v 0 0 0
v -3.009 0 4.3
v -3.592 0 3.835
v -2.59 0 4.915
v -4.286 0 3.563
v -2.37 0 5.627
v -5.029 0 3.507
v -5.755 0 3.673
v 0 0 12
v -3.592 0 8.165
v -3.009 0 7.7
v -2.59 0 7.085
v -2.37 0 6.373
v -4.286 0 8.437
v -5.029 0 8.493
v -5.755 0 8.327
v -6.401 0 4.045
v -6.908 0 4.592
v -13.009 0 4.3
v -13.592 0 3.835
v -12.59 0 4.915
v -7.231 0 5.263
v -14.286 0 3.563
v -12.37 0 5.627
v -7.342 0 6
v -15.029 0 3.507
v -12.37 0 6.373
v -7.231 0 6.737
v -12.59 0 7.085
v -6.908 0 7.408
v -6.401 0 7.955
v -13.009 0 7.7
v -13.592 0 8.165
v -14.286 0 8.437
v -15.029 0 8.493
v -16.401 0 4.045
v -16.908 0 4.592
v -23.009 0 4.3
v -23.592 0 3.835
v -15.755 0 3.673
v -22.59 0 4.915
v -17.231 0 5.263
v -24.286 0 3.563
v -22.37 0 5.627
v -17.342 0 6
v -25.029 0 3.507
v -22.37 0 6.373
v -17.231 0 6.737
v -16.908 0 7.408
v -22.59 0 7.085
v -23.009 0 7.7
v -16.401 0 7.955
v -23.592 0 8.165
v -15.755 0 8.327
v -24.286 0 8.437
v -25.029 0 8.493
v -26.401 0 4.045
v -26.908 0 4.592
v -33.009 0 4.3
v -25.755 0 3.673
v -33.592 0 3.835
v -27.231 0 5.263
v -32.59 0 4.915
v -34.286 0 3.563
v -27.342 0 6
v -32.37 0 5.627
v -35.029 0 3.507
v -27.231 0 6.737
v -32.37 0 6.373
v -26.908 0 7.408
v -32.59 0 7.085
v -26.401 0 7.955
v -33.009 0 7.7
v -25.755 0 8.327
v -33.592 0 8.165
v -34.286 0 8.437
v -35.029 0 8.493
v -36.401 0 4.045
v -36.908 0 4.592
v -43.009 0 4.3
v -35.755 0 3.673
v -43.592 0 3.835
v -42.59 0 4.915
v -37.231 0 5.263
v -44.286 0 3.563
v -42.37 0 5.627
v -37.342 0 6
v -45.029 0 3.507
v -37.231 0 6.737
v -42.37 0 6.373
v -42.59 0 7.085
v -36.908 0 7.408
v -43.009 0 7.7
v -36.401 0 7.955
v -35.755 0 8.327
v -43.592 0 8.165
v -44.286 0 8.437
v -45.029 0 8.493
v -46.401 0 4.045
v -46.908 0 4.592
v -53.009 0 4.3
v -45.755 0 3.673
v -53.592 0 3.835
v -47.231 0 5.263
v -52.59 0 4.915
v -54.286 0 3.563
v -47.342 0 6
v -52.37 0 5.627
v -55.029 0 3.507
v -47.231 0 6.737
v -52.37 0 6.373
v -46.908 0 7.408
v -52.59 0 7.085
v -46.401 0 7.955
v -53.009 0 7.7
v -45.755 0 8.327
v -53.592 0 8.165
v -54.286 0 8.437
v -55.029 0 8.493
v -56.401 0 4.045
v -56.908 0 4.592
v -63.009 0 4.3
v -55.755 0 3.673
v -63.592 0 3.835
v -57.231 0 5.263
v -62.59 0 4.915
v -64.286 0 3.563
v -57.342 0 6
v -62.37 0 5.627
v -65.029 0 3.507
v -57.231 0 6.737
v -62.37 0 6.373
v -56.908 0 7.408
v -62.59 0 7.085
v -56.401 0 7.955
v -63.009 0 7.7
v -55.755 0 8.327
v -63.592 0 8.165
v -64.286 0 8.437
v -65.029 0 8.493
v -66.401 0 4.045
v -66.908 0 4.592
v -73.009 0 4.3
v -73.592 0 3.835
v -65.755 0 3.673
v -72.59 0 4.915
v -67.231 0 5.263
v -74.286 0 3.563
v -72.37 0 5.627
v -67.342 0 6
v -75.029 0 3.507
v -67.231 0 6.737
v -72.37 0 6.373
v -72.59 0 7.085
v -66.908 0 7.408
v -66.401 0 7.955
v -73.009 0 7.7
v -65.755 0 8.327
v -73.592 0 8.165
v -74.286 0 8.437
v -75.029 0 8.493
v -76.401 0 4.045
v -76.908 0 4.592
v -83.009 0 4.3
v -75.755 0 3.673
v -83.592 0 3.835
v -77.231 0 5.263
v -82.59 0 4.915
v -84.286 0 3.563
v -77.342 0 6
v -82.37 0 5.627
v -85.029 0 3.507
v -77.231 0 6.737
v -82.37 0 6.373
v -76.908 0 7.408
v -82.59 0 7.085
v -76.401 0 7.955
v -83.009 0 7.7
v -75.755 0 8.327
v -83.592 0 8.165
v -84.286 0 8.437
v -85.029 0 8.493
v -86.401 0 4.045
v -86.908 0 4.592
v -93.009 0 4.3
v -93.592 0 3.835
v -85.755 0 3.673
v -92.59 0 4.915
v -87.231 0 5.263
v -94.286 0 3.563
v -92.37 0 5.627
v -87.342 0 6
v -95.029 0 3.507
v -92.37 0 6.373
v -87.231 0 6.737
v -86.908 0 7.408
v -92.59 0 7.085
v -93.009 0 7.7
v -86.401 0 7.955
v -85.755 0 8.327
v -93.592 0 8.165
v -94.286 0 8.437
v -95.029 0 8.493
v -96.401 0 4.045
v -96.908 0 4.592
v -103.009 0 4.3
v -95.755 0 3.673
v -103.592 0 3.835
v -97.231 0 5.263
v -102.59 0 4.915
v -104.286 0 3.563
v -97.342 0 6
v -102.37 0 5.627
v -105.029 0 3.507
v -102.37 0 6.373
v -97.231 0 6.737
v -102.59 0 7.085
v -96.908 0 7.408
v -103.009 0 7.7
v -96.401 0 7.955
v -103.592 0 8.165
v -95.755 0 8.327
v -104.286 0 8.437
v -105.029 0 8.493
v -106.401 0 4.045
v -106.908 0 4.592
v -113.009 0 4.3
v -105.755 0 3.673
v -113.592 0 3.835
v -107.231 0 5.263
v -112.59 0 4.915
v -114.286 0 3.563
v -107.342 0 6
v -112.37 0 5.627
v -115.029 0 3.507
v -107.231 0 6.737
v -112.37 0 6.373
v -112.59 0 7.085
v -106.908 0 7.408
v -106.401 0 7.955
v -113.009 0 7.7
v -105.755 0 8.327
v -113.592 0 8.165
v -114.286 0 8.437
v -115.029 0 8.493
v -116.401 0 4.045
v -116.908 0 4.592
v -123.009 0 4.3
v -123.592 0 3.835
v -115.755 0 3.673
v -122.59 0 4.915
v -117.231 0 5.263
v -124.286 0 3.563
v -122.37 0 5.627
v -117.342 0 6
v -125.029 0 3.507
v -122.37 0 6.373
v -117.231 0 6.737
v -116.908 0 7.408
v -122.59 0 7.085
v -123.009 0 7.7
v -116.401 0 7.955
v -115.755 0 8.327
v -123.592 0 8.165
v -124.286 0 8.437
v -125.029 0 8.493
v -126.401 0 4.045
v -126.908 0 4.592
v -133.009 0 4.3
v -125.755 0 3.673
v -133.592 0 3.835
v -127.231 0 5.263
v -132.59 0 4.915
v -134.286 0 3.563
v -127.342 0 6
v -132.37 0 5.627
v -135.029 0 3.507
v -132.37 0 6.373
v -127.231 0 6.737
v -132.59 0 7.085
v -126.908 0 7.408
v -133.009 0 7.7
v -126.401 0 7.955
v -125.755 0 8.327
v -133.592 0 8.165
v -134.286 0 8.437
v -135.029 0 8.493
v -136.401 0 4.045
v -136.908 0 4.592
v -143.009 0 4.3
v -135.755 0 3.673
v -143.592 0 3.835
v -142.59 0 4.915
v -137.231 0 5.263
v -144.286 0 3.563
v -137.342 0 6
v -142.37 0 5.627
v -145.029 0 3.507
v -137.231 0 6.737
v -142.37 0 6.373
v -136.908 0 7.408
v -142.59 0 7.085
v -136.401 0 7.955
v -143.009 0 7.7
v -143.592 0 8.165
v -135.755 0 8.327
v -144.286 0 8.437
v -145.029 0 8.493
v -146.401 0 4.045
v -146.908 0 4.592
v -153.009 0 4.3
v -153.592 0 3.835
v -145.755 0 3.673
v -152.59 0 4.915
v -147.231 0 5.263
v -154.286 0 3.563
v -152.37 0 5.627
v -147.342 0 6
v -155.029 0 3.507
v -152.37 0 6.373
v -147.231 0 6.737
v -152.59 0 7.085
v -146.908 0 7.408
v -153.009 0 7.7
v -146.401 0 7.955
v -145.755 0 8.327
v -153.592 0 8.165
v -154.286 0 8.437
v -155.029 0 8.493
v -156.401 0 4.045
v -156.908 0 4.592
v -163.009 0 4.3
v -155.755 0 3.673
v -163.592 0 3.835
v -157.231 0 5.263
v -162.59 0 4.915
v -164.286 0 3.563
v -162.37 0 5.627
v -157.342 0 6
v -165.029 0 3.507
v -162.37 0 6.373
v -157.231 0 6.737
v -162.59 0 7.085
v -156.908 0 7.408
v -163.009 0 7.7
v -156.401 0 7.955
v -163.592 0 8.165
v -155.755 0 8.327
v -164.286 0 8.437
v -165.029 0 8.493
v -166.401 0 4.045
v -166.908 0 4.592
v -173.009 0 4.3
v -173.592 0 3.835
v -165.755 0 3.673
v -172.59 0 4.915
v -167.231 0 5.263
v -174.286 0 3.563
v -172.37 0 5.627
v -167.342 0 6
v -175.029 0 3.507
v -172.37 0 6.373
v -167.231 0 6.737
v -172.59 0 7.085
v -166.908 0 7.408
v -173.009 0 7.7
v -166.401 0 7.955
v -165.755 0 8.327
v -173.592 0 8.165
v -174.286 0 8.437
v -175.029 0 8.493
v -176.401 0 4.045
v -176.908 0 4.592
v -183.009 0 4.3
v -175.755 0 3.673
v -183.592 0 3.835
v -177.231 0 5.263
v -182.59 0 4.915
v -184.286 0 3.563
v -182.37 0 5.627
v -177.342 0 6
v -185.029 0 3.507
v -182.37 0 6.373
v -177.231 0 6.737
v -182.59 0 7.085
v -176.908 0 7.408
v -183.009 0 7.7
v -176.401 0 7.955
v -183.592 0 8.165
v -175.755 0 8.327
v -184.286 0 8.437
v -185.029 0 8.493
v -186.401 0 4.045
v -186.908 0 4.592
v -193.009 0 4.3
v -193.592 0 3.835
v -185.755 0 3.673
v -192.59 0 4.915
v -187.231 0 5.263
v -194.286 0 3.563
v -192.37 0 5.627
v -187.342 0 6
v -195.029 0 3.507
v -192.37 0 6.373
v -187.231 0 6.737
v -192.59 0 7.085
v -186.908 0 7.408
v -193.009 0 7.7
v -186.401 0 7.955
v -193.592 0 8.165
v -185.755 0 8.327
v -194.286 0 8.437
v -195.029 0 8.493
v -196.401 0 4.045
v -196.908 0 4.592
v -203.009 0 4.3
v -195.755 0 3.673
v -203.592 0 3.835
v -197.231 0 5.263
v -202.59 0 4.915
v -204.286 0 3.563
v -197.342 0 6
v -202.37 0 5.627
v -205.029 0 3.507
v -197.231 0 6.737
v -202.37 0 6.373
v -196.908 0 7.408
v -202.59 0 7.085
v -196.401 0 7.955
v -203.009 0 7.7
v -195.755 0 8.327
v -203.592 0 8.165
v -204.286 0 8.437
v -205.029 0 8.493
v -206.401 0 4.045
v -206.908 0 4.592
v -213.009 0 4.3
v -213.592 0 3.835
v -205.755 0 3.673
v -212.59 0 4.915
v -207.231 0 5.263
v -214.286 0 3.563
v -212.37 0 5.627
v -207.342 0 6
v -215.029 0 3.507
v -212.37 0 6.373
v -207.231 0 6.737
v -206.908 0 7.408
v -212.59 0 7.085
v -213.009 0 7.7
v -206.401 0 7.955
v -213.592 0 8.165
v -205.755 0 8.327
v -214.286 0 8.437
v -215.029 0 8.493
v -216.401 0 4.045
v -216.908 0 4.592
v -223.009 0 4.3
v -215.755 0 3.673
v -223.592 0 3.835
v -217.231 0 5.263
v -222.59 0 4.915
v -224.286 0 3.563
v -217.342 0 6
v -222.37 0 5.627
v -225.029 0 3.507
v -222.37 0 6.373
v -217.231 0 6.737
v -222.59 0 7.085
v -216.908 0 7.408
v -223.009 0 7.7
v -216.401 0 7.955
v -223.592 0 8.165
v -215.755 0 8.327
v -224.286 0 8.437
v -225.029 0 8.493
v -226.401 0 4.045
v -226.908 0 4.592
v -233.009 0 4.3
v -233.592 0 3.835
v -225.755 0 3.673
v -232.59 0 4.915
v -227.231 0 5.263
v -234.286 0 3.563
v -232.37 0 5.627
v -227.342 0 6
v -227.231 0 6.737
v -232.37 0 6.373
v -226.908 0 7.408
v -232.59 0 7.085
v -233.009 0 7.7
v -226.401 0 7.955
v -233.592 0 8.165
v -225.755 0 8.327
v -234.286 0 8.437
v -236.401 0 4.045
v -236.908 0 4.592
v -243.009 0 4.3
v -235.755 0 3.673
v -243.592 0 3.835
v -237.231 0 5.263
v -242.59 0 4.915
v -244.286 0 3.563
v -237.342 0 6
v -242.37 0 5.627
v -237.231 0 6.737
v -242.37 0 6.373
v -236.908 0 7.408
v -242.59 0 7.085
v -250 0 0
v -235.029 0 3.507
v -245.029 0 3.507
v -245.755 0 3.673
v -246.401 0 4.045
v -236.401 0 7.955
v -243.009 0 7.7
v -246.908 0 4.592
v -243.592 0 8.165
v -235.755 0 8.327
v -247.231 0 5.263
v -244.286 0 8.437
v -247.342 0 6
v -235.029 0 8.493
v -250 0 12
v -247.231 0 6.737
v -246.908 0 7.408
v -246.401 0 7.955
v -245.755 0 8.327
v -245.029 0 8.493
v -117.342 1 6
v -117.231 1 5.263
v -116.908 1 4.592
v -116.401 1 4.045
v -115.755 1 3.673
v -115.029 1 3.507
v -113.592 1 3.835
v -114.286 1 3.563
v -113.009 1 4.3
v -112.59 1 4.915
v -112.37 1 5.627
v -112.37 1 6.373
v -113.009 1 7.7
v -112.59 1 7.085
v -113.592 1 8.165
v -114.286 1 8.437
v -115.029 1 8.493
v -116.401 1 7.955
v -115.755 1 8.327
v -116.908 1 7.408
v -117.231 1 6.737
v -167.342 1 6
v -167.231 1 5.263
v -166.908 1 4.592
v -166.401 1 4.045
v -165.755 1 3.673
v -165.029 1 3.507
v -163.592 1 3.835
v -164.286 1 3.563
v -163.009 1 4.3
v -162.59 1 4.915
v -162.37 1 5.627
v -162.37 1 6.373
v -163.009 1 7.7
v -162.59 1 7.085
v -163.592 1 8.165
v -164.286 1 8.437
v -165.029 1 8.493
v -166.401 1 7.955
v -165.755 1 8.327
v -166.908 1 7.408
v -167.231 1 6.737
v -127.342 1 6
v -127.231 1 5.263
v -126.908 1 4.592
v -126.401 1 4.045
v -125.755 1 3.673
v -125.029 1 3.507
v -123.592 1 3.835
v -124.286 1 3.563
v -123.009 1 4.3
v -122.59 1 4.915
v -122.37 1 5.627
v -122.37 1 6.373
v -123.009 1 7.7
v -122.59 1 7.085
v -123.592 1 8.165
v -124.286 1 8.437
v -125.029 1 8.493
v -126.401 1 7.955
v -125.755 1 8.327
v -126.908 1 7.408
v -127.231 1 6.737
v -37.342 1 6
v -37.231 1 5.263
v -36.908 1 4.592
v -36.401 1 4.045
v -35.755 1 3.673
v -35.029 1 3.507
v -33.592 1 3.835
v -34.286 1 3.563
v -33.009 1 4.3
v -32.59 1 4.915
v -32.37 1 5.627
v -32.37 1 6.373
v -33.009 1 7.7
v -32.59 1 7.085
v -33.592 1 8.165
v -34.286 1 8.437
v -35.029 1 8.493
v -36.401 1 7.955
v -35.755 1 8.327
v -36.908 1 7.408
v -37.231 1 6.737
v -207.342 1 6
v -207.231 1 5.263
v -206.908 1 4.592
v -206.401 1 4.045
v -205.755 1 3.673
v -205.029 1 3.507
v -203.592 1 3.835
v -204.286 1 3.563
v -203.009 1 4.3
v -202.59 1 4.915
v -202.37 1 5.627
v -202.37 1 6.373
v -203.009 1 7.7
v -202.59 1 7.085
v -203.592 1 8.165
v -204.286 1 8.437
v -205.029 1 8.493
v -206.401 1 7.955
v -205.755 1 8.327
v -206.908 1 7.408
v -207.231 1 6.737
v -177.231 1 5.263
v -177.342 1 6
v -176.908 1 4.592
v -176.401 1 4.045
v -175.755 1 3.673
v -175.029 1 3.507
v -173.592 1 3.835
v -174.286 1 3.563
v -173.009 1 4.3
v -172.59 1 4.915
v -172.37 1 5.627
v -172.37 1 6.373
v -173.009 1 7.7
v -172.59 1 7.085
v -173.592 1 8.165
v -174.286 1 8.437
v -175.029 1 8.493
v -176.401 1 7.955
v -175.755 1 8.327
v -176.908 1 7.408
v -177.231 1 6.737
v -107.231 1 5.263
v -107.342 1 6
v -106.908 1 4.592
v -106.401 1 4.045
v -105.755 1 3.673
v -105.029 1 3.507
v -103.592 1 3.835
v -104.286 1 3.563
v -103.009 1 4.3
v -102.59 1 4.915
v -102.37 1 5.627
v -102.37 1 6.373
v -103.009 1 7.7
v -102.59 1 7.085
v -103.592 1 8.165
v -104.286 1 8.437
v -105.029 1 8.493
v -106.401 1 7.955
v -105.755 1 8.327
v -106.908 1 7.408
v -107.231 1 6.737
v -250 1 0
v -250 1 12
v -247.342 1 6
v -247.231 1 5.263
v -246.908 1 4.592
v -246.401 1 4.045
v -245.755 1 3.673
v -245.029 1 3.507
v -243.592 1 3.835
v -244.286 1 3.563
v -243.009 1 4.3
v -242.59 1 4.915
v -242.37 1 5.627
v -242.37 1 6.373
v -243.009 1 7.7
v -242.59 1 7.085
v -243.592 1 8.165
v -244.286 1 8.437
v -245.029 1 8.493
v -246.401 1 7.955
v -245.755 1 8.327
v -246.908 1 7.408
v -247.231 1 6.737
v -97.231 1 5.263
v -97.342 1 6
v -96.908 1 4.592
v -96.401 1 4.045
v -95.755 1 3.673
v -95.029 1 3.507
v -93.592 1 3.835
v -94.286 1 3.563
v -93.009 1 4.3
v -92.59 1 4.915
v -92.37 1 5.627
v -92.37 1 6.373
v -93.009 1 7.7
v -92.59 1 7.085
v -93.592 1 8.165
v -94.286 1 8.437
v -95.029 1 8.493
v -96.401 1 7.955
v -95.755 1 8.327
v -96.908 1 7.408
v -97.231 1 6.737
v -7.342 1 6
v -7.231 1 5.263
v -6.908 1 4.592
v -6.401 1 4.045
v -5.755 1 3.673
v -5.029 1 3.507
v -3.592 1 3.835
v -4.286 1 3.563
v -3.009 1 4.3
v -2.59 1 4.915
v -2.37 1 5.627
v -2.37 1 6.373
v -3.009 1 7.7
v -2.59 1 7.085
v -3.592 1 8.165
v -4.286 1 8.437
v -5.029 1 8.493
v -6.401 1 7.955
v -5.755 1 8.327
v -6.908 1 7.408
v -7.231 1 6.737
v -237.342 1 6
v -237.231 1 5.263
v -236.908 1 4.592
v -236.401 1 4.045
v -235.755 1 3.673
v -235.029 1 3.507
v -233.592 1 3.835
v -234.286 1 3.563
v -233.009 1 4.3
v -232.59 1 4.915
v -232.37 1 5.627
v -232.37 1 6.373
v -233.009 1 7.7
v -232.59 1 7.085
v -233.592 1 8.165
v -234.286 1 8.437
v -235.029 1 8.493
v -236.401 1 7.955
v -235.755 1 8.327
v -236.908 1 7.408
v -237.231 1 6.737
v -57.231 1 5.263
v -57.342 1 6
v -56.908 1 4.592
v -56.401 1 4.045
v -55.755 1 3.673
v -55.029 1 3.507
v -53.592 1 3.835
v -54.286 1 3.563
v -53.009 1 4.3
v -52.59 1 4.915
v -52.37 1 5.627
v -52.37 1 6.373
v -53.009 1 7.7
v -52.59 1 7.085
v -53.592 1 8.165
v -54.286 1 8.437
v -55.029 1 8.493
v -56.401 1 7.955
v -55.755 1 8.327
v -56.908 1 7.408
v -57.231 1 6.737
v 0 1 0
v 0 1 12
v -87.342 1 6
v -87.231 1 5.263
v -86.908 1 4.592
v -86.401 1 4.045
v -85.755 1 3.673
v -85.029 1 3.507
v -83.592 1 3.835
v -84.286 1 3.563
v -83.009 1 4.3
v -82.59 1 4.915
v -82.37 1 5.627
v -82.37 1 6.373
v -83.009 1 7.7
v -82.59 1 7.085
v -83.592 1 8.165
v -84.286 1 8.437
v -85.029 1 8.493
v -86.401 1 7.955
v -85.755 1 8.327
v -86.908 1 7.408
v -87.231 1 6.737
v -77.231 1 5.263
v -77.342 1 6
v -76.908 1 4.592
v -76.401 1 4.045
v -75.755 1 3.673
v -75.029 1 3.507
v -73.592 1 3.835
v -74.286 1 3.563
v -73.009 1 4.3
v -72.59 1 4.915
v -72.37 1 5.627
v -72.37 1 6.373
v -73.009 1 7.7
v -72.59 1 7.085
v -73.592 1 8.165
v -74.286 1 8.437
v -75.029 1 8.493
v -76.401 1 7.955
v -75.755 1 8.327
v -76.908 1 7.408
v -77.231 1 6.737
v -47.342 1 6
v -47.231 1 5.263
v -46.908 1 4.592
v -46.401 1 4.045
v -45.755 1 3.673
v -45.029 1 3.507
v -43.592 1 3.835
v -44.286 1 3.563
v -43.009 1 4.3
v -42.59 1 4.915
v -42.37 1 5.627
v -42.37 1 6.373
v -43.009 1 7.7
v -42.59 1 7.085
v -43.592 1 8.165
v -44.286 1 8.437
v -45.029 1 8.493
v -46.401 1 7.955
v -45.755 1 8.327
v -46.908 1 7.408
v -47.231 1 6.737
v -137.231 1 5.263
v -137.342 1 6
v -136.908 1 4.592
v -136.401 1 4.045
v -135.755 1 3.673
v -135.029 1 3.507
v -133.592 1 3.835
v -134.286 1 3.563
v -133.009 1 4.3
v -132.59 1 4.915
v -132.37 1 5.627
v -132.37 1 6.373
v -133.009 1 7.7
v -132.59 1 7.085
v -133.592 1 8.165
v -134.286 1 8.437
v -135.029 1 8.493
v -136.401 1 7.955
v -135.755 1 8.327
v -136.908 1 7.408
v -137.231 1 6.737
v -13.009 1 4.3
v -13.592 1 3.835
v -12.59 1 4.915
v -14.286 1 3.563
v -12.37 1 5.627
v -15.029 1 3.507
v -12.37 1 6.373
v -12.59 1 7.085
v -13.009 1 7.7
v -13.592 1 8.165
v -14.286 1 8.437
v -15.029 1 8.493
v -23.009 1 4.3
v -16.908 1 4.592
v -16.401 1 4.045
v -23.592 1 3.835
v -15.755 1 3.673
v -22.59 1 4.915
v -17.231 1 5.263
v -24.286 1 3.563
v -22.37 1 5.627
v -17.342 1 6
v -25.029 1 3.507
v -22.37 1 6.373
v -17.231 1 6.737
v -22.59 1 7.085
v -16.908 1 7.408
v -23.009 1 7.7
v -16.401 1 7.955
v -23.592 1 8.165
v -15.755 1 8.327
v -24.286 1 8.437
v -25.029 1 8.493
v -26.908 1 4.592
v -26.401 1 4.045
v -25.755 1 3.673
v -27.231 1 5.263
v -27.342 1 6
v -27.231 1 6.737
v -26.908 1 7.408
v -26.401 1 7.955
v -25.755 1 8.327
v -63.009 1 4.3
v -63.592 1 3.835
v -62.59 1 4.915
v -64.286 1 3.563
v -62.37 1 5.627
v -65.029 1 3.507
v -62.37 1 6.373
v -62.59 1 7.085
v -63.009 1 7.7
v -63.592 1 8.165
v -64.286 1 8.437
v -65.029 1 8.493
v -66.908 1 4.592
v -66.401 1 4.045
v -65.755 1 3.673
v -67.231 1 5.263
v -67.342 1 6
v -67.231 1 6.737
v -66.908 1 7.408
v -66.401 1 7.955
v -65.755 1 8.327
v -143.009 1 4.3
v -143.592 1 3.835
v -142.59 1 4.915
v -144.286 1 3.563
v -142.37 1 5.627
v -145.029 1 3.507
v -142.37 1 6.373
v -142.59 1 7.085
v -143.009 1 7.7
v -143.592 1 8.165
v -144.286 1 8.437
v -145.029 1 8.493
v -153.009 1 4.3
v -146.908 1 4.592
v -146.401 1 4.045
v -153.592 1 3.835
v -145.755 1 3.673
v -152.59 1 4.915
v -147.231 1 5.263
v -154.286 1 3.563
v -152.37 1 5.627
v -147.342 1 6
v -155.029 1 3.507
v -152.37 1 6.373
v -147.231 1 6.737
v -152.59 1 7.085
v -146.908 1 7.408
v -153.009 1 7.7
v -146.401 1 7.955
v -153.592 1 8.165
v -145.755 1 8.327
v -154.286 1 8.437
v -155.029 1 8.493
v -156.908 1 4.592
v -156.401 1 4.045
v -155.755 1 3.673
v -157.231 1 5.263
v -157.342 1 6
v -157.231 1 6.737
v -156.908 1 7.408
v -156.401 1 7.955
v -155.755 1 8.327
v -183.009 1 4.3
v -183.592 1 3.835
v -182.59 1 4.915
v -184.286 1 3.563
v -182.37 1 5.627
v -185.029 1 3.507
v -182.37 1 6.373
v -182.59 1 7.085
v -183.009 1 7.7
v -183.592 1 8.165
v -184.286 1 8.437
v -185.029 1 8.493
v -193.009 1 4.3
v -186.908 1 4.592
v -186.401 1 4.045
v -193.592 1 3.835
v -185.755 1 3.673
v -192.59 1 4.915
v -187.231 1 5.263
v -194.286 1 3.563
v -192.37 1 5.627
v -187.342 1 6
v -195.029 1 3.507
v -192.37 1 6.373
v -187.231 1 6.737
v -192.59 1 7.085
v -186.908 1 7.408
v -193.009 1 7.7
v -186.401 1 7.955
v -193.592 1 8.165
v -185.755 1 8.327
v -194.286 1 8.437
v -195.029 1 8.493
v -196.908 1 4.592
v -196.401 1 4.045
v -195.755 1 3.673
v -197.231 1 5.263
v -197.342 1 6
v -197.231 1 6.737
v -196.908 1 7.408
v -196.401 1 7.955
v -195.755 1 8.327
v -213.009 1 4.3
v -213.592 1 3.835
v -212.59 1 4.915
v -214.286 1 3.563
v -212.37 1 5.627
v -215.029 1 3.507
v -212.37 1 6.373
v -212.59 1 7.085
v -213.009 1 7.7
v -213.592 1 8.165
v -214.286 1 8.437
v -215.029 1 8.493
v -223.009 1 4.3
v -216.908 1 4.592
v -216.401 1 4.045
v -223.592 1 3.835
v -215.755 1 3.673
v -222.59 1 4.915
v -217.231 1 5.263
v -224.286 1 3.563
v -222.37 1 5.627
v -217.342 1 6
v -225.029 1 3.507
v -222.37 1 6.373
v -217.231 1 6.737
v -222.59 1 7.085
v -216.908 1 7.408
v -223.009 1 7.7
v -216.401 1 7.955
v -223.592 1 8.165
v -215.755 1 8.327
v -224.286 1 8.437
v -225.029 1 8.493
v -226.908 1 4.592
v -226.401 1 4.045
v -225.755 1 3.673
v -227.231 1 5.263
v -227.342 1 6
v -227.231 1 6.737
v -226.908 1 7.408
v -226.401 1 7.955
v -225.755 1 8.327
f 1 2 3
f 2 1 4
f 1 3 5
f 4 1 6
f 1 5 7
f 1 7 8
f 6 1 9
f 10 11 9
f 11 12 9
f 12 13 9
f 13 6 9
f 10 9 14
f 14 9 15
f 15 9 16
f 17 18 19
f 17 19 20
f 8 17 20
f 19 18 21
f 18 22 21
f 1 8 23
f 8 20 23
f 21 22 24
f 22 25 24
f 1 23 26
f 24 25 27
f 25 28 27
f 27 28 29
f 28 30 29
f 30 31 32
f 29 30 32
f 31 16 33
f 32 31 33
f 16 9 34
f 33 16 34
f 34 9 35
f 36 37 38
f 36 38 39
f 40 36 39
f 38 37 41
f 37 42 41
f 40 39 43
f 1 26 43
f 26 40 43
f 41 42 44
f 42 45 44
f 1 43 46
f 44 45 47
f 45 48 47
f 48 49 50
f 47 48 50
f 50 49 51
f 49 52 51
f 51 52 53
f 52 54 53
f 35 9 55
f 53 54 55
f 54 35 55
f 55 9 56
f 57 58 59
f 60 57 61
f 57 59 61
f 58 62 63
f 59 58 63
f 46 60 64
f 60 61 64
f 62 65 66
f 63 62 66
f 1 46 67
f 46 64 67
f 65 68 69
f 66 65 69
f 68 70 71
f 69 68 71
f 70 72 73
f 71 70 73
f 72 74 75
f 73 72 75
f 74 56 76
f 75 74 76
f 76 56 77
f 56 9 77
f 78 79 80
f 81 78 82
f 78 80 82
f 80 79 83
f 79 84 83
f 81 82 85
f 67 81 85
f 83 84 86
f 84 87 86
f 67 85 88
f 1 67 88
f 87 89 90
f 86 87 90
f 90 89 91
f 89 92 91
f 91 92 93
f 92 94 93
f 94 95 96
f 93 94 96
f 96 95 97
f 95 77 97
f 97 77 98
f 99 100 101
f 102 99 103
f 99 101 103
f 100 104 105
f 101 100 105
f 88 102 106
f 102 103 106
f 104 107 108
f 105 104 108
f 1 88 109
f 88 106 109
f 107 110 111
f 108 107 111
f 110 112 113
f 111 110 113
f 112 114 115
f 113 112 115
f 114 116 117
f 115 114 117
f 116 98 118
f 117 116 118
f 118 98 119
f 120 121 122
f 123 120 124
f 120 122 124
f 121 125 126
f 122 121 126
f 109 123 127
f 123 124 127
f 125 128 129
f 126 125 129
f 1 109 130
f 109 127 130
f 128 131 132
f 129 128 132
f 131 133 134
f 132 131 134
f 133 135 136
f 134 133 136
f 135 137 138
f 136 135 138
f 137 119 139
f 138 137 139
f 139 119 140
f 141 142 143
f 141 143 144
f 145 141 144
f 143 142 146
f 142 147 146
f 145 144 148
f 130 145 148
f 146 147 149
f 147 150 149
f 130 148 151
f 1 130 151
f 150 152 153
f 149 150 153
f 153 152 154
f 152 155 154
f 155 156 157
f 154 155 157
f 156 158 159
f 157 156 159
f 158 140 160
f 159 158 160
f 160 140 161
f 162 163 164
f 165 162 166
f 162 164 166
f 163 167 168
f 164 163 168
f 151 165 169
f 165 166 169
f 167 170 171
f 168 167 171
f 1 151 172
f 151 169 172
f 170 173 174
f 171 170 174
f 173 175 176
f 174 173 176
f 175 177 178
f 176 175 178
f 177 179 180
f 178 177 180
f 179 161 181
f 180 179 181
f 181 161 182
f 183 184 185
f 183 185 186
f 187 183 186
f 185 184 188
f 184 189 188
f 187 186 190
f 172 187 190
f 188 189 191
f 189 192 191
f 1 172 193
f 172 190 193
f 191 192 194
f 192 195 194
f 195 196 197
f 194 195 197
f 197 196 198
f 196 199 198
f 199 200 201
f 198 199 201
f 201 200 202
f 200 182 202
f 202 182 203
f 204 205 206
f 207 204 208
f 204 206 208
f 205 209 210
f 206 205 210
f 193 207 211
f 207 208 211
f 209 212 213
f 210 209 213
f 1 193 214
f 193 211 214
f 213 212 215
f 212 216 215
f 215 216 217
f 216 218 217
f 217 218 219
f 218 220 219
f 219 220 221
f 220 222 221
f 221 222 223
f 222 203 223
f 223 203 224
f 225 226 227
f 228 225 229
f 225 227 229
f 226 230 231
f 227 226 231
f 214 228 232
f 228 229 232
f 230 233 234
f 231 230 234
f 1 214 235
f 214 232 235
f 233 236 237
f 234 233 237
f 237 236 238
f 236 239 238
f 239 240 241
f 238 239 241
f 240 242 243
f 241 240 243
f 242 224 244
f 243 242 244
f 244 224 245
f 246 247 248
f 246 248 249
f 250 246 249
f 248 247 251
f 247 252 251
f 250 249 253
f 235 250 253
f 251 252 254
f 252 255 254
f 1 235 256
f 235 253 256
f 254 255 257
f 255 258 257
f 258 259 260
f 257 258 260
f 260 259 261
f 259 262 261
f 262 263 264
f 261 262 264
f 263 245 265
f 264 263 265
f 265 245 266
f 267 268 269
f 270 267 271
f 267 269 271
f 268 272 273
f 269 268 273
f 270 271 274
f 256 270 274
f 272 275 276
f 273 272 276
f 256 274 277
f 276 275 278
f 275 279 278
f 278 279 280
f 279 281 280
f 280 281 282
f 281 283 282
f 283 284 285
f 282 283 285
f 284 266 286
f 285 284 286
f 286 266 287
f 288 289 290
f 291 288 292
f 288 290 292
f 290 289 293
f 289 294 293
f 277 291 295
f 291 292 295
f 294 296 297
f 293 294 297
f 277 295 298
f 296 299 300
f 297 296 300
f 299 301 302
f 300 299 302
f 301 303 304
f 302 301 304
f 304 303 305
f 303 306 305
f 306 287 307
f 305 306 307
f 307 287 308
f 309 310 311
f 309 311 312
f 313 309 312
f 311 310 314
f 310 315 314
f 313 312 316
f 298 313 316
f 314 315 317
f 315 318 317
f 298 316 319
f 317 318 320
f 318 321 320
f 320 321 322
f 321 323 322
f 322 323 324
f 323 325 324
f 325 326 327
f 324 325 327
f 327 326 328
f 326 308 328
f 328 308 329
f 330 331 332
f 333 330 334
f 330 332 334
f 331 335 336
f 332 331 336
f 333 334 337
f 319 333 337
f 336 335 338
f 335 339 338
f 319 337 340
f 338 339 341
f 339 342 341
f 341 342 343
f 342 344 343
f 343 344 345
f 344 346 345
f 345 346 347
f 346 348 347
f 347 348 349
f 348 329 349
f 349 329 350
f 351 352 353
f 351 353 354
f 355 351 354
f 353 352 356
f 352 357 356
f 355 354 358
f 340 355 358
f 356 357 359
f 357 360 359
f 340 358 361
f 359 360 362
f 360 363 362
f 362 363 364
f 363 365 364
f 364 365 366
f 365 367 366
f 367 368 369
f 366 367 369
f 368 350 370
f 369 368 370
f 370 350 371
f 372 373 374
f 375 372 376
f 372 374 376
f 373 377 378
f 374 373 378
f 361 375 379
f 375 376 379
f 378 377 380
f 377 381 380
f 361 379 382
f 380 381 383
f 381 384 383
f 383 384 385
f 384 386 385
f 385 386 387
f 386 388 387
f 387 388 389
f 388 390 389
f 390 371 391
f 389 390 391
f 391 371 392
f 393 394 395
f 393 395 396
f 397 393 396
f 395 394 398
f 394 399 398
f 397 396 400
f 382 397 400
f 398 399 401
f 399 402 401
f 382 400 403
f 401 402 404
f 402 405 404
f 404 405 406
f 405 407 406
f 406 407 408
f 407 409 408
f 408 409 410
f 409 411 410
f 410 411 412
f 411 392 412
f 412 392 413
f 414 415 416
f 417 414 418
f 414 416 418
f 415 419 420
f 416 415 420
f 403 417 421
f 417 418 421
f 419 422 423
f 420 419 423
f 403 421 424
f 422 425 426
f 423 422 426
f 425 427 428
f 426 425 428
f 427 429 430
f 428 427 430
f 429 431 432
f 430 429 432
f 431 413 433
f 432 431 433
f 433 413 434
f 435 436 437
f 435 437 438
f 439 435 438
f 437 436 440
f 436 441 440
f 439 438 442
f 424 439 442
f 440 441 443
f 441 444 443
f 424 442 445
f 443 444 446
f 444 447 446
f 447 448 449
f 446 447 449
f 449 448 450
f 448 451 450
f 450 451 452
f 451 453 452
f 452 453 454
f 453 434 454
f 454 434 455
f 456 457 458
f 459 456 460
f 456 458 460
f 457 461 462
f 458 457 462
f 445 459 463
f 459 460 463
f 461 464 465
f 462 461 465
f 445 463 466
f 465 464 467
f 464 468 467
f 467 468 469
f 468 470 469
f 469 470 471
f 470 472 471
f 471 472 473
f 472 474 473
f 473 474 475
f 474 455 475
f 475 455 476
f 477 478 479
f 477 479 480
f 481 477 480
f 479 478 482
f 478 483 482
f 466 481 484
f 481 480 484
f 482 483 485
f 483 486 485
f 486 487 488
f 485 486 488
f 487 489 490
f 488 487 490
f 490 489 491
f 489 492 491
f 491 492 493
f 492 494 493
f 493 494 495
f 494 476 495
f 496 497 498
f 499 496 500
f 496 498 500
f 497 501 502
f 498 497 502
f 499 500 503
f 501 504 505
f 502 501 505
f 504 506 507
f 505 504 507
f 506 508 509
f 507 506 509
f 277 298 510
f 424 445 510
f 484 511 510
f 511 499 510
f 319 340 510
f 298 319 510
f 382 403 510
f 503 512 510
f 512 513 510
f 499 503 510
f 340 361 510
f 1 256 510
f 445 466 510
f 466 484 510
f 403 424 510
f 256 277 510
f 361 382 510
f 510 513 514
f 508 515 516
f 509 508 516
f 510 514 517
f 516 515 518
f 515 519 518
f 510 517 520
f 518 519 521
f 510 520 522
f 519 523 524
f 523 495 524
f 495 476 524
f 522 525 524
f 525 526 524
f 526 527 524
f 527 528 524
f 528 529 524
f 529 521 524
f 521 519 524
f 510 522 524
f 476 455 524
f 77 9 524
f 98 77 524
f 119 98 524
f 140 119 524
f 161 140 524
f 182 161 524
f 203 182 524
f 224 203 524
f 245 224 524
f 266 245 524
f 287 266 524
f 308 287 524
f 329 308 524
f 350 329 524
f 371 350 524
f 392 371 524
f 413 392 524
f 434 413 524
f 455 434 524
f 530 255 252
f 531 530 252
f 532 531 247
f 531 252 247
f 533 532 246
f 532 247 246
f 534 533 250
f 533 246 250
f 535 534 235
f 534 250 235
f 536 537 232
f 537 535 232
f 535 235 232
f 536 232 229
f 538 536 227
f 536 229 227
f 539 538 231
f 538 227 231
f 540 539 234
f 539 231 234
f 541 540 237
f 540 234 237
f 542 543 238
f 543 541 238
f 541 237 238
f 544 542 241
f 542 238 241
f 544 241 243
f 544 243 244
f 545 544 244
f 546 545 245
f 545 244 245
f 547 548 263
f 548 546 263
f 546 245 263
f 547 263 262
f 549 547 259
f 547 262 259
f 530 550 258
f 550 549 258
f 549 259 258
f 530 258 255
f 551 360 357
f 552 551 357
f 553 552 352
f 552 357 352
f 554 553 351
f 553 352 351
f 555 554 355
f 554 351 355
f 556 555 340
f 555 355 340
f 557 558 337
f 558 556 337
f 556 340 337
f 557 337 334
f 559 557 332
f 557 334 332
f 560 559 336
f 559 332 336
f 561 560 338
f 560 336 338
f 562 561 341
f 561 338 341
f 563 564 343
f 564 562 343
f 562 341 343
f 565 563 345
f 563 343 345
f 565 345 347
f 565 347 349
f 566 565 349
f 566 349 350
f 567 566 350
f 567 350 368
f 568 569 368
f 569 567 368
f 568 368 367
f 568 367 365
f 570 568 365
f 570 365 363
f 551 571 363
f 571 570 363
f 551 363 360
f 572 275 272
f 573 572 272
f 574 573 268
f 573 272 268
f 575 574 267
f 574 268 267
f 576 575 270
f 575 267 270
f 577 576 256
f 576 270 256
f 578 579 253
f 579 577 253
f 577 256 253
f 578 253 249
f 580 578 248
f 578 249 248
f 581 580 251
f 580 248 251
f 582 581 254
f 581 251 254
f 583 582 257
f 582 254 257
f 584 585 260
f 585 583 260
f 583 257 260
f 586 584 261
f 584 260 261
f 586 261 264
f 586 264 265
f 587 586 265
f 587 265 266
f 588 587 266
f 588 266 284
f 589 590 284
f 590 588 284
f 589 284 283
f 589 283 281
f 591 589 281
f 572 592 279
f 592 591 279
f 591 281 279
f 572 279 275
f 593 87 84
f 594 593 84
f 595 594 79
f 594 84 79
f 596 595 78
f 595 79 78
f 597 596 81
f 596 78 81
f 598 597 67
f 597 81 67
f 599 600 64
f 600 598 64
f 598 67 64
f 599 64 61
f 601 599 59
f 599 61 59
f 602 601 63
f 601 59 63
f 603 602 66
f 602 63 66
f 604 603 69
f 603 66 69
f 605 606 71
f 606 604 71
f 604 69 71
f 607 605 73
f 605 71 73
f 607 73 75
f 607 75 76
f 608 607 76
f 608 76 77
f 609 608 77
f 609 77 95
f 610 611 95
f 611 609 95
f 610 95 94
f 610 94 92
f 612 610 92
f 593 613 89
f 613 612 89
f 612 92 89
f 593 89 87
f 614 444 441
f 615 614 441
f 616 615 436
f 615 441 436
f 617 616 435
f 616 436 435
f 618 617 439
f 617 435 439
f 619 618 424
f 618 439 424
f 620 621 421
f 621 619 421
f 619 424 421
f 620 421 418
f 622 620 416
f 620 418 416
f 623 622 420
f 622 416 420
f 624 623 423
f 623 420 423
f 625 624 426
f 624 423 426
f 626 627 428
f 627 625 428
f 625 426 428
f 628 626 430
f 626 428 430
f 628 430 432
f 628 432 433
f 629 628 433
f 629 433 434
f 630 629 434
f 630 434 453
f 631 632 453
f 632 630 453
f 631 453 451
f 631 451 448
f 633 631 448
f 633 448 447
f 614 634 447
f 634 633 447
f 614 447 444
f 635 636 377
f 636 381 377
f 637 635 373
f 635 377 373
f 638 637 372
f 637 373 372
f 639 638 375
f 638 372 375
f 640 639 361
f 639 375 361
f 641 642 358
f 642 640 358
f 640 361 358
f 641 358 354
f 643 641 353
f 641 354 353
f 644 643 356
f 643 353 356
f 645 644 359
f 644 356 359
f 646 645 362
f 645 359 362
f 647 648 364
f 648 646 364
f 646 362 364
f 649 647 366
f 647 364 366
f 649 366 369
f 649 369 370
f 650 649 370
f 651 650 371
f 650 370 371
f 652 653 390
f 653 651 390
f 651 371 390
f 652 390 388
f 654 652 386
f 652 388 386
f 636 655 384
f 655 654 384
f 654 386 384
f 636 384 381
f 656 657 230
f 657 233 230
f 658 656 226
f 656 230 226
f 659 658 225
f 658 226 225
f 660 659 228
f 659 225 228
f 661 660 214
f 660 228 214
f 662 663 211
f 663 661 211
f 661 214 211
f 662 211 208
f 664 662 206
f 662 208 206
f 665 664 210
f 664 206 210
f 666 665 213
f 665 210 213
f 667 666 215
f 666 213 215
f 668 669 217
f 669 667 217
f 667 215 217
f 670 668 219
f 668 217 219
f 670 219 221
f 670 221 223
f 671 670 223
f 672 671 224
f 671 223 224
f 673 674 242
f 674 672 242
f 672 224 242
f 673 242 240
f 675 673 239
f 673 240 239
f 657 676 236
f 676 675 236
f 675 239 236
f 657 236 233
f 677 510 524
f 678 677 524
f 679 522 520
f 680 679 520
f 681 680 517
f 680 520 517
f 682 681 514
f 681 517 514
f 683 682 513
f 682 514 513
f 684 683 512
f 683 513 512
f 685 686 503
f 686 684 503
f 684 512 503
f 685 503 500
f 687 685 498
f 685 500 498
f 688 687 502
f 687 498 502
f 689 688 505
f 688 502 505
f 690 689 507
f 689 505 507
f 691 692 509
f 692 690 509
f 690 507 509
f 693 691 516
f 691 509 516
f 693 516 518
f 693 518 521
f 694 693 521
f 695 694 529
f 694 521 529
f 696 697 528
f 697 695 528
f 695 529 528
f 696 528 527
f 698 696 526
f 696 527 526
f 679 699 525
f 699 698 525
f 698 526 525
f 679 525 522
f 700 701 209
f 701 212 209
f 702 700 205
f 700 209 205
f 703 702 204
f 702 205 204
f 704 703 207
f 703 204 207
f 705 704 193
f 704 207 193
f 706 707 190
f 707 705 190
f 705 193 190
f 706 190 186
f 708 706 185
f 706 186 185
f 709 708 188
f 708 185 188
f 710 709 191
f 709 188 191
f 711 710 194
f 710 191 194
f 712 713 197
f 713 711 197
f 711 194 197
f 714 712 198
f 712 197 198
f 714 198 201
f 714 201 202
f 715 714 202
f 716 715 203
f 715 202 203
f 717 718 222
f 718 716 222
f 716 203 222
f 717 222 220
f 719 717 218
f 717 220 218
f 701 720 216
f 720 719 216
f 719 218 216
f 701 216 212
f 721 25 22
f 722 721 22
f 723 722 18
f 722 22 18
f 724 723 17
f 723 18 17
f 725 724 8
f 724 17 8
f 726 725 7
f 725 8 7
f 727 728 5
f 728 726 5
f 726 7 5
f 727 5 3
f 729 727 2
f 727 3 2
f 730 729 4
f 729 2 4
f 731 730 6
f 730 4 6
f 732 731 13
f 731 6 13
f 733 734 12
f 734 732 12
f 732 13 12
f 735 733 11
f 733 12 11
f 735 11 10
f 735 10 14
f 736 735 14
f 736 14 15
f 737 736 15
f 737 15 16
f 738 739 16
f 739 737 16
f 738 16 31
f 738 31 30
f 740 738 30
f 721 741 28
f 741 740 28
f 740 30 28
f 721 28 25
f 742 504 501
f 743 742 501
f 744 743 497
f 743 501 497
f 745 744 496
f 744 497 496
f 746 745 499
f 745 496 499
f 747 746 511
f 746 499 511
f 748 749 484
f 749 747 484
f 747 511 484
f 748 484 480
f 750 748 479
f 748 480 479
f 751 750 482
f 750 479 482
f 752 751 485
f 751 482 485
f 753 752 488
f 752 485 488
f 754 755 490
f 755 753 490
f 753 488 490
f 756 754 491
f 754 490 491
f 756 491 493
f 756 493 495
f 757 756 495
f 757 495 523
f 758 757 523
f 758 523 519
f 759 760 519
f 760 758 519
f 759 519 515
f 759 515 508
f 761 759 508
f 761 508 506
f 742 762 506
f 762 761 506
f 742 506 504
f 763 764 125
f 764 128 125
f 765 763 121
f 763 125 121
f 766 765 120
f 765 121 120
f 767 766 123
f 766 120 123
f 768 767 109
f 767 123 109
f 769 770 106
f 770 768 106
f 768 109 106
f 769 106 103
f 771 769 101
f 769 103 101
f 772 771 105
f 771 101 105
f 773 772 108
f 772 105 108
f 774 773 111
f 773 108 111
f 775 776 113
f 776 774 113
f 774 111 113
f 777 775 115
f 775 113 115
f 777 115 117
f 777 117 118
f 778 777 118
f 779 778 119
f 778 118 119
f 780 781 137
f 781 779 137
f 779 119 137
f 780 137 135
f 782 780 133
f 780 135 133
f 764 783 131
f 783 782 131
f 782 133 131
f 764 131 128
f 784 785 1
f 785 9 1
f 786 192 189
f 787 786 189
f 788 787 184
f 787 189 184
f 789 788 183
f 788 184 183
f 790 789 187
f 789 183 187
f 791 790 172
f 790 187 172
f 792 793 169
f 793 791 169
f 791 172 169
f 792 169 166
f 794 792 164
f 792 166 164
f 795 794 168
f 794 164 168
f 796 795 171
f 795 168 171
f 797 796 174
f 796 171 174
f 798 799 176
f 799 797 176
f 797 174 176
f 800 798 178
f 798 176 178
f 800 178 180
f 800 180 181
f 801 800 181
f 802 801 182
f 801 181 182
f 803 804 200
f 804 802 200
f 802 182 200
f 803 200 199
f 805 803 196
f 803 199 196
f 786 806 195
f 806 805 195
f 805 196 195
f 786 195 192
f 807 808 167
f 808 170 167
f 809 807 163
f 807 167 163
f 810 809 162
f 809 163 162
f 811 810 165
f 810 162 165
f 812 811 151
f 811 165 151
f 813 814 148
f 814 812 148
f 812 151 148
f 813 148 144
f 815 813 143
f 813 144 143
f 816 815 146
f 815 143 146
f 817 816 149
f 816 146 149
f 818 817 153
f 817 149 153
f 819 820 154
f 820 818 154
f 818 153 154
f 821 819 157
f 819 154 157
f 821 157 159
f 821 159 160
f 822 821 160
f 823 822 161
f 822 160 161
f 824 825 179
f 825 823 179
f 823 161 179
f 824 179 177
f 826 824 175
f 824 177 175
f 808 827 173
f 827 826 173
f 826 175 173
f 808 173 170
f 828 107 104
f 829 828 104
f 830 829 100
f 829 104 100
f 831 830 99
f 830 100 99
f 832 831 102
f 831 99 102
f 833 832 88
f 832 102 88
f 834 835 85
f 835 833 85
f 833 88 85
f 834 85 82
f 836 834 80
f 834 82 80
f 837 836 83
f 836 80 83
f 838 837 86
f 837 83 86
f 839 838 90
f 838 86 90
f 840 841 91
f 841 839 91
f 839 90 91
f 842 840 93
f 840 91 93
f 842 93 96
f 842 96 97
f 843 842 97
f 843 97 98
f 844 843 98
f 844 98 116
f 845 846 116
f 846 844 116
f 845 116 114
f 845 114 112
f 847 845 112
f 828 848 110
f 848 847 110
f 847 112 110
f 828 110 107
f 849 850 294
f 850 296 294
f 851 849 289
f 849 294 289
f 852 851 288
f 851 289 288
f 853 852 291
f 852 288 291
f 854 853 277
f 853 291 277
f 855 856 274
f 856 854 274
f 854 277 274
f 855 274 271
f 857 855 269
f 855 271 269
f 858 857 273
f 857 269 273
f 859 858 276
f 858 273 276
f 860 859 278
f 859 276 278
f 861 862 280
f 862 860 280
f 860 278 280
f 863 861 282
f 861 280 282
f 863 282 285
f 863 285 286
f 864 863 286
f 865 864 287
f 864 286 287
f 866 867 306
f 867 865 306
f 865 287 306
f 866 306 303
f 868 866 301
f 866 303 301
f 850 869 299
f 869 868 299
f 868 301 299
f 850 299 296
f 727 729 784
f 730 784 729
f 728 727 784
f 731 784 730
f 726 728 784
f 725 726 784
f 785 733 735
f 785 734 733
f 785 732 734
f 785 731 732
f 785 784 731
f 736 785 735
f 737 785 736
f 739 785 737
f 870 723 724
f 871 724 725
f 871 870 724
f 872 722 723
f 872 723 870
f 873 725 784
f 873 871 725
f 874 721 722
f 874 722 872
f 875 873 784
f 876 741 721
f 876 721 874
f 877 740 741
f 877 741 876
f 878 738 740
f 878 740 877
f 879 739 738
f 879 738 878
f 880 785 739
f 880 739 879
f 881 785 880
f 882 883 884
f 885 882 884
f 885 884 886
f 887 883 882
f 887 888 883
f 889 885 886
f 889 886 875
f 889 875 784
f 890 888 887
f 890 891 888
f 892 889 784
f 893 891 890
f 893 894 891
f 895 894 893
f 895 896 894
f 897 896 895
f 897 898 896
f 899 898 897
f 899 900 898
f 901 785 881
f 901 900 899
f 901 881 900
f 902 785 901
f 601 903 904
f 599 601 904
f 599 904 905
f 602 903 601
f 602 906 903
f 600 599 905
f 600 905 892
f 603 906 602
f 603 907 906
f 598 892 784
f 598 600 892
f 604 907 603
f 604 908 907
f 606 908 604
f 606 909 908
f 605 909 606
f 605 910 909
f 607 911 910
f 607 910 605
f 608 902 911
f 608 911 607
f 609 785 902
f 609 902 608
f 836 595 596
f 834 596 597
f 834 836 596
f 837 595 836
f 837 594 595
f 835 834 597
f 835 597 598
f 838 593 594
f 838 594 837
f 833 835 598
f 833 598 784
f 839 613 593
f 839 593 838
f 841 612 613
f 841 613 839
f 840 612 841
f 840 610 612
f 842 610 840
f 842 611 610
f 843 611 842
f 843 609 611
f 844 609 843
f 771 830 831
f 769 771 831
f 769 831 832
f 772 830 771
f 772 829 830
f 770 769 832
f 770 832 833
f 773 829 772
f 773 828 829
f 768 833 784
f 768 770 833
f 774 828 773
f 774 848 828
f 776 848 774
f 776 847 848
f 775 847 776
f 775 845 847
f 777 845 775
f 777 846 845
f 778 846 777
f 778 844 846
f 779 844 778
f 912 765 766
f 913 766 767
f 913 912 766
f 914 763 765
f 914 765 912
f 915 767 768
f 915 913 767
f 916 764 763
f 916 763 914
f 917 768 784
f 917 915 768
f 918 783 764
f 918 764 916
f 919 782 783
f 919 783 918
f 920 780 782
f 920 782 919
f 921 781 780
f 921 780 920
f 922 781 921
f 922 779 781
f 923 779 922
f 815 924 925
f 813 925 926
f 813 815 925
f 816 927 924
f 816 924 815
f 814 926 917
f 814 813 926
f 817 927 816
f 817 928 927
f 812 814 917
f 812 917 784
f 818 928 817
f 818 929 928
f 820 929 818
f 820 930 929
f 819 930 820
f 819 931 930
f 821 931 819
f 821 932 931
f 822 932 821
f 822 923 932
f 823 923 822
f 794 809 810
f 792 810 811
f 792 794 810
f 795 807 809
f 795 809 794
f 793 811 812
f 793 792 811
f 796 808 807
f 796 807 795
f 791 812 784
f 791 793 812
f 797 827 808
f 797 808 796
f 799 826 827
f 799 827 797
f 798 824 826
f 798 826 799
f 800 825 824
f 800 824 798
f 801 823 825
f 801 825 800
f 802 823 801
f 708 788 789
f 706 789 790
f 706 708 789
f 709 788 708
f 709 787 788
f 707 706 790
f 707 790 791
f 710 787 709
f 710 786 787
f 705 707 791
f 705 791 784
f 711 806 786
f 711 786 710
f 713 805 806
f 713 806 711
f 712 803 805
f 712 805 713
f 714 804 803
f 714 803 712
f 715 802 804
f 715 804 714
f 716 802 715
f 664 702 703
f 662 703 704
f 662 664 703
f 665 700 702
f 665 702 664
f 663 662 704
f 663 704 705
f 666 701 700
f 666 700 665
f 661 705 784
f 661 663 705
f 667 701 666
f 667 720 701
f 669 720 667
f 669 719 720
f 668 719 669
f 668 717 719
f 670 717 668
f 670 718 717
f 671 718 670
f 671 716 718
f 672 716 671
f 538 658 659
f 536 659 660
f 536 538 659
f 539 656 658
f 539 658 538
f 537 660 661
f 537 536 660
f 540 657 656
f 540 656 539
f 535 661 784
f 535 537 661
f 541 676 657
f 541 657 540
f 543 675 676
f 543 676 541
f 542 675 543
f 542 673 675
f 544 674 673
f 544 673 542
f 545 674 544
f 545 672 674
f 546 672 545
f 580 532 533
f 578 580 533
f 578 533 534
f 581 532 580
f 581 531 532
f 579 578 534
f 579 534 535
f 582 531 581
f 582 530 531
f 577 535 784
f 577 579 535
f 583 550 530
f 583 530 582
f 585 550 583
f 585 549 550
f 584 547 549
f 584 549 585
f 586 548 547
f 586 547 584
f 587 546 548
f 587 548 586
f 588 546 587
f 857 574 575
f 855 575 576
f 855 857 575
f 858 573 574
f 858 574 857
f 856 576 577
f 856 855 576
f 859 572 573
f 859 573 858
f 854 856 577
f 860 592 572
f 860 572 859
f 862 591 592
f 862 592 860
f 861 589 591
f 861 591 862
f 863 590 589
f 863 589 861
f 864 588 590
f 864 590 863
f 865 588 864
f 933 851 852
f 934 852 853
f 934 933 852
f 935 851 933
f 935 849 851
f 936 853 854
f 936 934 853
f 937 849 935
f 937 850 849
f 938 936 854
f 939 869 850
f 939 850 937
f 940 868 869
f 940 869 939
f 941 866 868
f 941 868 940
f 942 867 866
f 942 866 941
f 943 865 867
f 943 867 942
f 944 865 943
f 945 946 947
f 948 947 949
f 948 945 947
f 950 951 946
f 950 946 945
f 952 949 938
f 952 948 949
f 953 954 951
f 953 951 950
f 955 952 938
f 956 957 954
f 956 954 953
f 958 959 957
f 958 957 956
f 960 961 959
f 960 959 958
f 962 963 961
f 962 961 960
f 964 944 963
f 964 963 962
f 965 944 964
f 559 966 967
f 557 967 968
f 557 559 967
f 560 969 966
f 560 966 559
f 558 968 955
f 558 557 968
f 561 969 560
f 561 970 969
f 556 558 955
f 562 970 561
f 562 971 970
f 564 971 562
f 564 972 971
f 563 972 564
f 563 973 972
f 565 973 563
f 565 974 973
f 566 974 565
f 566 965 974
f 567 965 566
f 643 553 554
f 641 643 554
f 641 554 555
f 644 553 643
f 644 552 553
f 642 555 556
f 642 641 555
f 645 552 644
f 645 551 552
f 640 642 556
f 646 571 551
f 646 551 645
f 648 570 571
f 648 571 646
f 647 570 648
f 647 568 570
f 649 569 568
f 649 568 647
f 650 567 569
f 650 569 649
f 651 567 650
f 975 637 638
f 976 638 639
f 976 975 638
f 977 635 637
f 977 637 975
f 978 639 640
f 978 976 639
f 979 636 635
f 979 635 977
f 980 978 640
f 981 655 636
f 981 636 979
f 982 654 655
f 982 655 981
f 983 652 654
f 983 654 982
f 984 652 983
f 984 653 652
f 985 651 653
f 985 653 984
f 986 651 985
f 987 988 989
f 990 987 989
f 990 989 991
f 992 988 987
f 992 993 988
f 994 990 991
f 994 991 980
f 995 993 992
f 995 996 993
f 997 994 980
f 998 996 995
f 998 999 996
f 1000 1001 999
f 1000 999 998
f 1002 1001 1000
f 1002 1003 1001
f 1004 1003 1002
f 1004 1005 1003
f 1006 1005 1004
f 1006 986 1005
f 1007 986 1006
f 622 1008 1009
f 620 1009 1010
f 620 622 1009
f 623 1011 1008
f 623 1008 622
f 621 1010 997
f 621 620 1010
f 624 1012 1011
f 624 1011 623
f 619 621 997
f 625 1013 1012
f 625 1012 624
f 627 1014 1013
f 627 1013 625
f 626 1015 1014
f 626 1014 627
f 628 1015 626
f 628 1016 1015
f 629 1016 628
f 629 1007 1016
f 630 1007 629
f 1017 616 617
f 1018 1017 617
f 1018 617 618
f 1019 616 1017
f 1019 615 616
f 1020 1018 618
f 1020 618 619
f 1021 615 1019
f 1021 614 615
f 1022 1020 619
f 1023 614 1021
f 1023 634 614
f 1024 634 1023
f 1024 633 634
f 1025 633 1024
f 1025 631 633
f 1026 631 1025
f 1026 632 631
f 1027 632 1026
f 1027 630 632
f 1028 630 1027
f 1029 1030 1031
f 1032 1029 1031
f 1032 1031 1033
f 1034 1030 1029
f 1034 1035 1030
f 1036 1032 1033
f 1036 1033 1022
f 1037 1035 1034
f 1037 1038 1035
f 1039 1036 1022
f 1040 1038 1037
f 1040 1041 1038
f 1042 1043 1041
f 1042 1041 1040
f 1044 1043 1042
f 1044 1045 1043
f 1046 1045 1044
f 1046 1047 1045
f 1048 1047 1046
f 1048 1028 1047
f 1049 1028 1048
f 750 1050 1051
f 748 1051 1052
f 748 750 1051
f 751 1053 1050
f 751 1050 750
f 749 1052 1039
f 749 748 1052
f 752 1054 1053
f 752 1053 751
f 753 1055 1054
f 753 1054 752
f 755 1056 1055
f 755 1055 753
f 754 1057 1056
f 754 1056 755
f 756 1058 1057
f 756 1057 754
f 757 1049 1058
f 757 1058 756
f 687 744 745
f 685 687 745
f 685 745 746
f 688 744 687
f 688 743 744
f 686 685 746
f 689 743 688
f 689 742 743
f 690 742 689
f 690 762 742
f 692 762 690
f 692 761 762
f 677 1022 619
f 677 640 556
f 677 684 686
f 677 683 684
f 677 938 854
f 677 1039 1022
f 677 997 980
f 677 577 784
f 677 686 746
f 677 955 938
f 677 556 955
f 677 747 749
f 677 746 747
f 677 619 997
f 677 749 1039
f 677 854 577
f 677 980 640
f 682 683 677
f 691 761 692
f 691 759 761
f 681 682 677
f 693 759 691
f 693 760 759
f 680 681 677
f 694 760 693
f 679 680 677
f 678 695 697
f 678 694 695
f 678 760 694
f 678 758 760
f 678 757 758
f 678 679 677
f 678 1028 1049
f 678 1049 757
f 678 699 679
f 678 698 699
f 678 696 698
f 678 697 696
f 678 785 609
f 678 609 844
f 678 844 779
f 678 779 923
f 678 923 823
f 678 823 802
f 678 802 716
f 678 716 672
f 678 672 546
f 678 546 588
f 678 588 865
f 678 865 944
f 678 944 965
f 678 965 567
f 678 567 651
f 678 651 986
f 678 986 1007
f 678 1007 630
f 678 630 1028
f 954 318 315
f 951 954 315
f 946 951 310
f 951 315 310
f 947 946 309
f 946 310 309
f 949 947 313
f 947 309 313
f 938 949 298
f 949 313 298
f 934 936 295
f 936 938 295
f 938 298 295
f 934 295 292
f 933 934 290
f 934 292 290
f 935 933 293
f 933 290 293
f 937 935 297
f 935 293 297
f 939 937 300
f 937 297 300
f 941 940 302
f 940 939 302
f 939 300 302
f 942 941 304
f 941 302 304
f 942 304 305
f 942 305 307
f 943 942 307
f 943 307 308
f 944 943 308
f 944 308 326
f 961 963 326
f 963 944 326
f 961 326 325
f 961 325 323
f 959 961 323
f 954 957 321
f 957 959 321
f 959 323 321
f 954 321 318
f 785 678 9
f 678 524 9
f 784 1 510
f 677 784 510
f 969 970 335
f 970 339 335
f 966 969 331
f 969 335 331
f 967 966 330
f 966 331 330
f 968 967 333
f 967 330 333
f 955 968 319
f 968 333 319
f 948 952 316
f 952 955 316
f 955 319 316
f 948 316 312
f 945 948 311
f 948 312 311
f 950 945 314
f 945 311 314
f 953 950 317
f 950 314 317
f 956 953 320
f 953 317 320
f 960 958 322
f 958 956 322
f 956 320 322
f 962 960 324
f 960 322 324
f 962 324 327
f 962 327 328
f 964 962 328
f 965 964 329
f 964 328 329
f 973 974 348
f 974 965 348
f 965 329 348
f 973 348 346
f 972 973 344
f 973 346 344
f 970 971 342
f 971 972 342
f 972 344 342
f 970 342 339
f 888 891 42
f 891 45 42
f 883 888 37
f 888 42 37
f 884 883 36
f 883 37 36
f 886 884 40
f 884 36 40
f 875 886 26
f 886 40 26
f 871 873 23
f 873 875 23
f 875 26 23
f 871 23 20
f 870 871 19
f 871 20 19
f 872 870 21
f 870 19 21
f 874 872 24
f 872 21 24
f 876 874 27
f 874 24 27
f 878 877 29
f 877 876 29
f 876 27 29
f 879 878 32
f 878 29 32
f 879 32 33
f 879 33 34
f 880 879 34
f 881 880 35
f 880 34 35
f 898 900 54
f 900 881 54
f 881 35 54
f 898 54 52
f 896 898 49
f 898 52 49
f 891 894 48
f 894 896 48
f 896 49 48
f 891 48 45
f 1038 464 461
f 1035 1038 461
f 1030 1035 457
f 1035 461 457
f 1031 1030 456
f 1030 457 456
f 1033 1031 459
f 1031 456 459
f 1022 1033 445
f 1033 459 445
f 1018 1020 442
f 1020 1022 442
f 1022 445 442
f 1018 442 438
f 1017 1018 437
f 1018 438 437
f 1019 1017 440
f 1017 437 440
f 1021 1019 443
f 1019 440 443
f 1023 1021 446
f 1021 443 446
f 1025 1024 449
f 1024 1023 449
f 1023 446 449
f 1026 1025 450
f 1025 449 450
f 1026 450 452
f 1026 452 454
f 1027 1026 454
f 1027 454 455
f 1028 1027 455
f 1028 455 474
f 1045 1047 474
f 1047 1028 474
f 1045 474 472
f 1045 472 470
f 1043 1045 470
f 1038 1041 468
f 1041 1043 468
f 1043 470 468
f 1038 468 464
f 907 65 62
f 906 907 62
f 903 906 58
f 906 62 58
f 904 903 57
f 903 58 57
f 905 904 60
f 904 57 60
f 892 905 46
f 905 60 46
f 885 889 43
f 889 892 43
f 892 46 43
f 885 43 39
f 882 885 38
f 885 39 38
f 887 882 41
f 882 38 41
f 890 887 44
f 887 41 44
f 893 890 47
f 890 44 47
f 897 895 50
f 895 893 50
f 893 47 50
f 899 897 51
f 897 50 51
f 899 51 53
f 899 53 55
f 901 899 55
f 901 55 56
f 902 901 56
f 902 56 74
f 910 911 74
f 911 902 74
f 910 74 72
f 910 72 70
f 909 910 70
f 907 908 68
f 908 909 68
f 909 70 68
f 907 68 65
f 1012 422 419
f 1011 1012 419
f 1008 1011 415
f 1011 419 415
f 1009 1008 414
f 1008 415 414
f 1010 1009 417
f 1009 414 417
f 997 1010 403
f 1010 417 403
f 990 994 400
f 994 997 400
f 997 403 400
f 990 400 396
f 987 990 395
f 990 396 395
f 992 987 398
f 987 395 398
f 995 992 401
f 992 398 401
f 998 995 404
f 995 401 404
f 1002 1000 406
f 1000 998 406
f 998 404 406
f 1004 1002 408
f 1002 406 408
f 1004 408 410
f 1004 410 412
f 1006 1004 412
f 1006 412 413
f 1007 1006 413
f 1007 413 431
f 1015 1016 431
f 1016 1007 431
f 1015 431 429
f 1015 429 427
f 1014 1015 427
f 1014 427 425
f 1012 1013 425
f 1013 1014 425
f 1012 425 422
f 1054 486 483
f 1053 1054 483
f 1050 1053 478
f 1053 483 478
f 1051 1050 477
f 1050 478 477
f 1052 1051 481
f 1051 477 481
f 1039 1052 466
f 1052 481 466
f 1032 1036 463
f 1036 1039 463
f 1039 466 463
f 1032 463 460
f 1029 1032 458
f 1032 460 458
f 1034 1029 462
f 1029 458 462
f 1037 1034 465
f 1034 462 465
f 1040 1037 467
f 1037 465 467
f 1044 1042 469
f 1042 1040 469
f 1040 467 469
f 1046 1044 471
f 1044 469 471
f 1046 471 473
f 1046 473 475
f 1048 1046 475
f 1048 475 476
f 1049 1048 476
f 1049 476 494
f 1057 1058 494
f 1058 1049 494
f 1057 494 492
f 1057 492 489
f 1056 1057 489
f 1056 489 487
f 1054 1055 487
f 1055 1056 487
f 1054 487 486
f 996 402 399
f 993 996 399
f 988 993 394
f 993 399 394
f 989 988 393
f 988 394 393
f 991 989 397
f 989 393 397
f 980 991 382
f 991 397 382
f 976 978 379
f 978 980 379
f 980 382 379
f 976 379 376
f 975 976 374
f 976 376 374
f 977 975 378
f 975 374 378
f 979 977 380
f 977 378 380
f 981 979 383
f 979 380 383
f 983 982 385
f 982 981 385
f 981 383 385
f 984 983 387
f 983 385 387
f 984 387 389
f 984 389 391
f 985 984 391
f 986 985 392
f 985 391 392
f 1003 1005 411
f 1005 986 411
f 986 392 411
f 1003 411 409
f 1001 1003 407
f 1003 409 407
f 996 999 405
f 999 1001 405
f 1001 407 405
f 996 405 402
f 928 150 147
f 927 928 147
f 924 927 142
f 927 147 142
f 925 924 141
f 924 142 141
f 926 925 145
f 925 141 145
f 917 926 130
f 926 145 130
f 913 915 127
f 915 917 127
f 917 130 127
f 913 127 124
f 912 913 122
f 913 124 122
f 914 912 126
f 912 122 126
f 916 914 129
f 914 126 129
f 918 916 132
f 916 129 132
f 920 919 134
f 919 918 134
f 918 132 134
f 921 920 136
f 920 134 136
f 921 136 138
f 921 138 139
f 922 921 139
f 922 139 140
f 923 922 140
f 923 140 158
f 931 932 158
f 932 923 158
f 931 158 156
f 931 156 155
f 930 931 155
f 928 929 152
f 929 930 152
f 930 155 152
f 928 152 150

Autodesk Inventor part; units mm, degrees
ref_plane "YZ Plane" through (0, 0, 0) normal (1, 0, 0) x (0, 1, 0)
ref_plane "XZ Plane" through (0, 0, 0) normal (0, 1, 0) x (-1, 0, 0)
ref_plane "XY Plane" through (0, 0, 0) normal (0, 0, 1) x (1, 0, 0)
sketch "Esboço1" plane through (0, 0, 0) normal (0, 1, 0) x (-1, 0, 0)
  line L0 (0, 0) -> (250, 0)
  line L1 (250, 0) -> (250, 12)
  line L2 (250, 12) -> (0, 12)
  line L3 (0, 12) -> (0, 0)
  circle A0 centre (4.8421, 6) radius 2.5
  circle A1 centre (14.8421, 6) radius 2.5
  circle A2 centre (24.8421, 6) radius 2.5
  circle A3 centre (34.8421, 6) radius 2.5
  circle A4 centre (44.8421, 6) radius 2.5
  circle A5 centre (54.8421, 6) radius 2.5
  circle A6 centre (64.8421, 6) radius 2.5
  circle A7 centre (74.8421, 6) radius 2.5
  circle A8 centre (84.8421, 6) radius 2.5
  circle A9 centre (94.8421, 6) radius 2.5
  circle A10 centre (104.8421, 6) radius 2.5
  circle A11 centre (114.8421, 6) radius 2.5
  circle A12 centre (124.8421, 6) radius 2.5
  circle A13 centre (134.8421, 6) radius 2.5
  circle A14 centre (144.8421, 6) radius 2.5
  circle A15 centre (154.8421, 6) radius 2.5
  circle A16 centre (164.8421, 6) radius 2.5
  circle A17 centre (174.8421, 6) radius 2.5
  circle A18 centre (184.8421, 6) radius 2.5
  circle A19 centre (194.8421, 6) radius 2.5
  circle A20 centre (204.8421, 6) radius 2.5
  circle A21 centre (214.8421, 6) radius 2.5
  circle A22 centre (224.8421, 6) radius 2.5
  circle A23 centre (234.8421, 6) radius 2.5
  circle A24 centre (244.8421, 6) radius 2.5
  dimension "d0" = 250
  dimension "d1" = 12
  dimension "d2" = 5
  dimension "d8" = 10
extrude "Extrusão1" add sketch "Esboço1" along normal blind 1
properties part number "aste" material "Aço, carbono"
